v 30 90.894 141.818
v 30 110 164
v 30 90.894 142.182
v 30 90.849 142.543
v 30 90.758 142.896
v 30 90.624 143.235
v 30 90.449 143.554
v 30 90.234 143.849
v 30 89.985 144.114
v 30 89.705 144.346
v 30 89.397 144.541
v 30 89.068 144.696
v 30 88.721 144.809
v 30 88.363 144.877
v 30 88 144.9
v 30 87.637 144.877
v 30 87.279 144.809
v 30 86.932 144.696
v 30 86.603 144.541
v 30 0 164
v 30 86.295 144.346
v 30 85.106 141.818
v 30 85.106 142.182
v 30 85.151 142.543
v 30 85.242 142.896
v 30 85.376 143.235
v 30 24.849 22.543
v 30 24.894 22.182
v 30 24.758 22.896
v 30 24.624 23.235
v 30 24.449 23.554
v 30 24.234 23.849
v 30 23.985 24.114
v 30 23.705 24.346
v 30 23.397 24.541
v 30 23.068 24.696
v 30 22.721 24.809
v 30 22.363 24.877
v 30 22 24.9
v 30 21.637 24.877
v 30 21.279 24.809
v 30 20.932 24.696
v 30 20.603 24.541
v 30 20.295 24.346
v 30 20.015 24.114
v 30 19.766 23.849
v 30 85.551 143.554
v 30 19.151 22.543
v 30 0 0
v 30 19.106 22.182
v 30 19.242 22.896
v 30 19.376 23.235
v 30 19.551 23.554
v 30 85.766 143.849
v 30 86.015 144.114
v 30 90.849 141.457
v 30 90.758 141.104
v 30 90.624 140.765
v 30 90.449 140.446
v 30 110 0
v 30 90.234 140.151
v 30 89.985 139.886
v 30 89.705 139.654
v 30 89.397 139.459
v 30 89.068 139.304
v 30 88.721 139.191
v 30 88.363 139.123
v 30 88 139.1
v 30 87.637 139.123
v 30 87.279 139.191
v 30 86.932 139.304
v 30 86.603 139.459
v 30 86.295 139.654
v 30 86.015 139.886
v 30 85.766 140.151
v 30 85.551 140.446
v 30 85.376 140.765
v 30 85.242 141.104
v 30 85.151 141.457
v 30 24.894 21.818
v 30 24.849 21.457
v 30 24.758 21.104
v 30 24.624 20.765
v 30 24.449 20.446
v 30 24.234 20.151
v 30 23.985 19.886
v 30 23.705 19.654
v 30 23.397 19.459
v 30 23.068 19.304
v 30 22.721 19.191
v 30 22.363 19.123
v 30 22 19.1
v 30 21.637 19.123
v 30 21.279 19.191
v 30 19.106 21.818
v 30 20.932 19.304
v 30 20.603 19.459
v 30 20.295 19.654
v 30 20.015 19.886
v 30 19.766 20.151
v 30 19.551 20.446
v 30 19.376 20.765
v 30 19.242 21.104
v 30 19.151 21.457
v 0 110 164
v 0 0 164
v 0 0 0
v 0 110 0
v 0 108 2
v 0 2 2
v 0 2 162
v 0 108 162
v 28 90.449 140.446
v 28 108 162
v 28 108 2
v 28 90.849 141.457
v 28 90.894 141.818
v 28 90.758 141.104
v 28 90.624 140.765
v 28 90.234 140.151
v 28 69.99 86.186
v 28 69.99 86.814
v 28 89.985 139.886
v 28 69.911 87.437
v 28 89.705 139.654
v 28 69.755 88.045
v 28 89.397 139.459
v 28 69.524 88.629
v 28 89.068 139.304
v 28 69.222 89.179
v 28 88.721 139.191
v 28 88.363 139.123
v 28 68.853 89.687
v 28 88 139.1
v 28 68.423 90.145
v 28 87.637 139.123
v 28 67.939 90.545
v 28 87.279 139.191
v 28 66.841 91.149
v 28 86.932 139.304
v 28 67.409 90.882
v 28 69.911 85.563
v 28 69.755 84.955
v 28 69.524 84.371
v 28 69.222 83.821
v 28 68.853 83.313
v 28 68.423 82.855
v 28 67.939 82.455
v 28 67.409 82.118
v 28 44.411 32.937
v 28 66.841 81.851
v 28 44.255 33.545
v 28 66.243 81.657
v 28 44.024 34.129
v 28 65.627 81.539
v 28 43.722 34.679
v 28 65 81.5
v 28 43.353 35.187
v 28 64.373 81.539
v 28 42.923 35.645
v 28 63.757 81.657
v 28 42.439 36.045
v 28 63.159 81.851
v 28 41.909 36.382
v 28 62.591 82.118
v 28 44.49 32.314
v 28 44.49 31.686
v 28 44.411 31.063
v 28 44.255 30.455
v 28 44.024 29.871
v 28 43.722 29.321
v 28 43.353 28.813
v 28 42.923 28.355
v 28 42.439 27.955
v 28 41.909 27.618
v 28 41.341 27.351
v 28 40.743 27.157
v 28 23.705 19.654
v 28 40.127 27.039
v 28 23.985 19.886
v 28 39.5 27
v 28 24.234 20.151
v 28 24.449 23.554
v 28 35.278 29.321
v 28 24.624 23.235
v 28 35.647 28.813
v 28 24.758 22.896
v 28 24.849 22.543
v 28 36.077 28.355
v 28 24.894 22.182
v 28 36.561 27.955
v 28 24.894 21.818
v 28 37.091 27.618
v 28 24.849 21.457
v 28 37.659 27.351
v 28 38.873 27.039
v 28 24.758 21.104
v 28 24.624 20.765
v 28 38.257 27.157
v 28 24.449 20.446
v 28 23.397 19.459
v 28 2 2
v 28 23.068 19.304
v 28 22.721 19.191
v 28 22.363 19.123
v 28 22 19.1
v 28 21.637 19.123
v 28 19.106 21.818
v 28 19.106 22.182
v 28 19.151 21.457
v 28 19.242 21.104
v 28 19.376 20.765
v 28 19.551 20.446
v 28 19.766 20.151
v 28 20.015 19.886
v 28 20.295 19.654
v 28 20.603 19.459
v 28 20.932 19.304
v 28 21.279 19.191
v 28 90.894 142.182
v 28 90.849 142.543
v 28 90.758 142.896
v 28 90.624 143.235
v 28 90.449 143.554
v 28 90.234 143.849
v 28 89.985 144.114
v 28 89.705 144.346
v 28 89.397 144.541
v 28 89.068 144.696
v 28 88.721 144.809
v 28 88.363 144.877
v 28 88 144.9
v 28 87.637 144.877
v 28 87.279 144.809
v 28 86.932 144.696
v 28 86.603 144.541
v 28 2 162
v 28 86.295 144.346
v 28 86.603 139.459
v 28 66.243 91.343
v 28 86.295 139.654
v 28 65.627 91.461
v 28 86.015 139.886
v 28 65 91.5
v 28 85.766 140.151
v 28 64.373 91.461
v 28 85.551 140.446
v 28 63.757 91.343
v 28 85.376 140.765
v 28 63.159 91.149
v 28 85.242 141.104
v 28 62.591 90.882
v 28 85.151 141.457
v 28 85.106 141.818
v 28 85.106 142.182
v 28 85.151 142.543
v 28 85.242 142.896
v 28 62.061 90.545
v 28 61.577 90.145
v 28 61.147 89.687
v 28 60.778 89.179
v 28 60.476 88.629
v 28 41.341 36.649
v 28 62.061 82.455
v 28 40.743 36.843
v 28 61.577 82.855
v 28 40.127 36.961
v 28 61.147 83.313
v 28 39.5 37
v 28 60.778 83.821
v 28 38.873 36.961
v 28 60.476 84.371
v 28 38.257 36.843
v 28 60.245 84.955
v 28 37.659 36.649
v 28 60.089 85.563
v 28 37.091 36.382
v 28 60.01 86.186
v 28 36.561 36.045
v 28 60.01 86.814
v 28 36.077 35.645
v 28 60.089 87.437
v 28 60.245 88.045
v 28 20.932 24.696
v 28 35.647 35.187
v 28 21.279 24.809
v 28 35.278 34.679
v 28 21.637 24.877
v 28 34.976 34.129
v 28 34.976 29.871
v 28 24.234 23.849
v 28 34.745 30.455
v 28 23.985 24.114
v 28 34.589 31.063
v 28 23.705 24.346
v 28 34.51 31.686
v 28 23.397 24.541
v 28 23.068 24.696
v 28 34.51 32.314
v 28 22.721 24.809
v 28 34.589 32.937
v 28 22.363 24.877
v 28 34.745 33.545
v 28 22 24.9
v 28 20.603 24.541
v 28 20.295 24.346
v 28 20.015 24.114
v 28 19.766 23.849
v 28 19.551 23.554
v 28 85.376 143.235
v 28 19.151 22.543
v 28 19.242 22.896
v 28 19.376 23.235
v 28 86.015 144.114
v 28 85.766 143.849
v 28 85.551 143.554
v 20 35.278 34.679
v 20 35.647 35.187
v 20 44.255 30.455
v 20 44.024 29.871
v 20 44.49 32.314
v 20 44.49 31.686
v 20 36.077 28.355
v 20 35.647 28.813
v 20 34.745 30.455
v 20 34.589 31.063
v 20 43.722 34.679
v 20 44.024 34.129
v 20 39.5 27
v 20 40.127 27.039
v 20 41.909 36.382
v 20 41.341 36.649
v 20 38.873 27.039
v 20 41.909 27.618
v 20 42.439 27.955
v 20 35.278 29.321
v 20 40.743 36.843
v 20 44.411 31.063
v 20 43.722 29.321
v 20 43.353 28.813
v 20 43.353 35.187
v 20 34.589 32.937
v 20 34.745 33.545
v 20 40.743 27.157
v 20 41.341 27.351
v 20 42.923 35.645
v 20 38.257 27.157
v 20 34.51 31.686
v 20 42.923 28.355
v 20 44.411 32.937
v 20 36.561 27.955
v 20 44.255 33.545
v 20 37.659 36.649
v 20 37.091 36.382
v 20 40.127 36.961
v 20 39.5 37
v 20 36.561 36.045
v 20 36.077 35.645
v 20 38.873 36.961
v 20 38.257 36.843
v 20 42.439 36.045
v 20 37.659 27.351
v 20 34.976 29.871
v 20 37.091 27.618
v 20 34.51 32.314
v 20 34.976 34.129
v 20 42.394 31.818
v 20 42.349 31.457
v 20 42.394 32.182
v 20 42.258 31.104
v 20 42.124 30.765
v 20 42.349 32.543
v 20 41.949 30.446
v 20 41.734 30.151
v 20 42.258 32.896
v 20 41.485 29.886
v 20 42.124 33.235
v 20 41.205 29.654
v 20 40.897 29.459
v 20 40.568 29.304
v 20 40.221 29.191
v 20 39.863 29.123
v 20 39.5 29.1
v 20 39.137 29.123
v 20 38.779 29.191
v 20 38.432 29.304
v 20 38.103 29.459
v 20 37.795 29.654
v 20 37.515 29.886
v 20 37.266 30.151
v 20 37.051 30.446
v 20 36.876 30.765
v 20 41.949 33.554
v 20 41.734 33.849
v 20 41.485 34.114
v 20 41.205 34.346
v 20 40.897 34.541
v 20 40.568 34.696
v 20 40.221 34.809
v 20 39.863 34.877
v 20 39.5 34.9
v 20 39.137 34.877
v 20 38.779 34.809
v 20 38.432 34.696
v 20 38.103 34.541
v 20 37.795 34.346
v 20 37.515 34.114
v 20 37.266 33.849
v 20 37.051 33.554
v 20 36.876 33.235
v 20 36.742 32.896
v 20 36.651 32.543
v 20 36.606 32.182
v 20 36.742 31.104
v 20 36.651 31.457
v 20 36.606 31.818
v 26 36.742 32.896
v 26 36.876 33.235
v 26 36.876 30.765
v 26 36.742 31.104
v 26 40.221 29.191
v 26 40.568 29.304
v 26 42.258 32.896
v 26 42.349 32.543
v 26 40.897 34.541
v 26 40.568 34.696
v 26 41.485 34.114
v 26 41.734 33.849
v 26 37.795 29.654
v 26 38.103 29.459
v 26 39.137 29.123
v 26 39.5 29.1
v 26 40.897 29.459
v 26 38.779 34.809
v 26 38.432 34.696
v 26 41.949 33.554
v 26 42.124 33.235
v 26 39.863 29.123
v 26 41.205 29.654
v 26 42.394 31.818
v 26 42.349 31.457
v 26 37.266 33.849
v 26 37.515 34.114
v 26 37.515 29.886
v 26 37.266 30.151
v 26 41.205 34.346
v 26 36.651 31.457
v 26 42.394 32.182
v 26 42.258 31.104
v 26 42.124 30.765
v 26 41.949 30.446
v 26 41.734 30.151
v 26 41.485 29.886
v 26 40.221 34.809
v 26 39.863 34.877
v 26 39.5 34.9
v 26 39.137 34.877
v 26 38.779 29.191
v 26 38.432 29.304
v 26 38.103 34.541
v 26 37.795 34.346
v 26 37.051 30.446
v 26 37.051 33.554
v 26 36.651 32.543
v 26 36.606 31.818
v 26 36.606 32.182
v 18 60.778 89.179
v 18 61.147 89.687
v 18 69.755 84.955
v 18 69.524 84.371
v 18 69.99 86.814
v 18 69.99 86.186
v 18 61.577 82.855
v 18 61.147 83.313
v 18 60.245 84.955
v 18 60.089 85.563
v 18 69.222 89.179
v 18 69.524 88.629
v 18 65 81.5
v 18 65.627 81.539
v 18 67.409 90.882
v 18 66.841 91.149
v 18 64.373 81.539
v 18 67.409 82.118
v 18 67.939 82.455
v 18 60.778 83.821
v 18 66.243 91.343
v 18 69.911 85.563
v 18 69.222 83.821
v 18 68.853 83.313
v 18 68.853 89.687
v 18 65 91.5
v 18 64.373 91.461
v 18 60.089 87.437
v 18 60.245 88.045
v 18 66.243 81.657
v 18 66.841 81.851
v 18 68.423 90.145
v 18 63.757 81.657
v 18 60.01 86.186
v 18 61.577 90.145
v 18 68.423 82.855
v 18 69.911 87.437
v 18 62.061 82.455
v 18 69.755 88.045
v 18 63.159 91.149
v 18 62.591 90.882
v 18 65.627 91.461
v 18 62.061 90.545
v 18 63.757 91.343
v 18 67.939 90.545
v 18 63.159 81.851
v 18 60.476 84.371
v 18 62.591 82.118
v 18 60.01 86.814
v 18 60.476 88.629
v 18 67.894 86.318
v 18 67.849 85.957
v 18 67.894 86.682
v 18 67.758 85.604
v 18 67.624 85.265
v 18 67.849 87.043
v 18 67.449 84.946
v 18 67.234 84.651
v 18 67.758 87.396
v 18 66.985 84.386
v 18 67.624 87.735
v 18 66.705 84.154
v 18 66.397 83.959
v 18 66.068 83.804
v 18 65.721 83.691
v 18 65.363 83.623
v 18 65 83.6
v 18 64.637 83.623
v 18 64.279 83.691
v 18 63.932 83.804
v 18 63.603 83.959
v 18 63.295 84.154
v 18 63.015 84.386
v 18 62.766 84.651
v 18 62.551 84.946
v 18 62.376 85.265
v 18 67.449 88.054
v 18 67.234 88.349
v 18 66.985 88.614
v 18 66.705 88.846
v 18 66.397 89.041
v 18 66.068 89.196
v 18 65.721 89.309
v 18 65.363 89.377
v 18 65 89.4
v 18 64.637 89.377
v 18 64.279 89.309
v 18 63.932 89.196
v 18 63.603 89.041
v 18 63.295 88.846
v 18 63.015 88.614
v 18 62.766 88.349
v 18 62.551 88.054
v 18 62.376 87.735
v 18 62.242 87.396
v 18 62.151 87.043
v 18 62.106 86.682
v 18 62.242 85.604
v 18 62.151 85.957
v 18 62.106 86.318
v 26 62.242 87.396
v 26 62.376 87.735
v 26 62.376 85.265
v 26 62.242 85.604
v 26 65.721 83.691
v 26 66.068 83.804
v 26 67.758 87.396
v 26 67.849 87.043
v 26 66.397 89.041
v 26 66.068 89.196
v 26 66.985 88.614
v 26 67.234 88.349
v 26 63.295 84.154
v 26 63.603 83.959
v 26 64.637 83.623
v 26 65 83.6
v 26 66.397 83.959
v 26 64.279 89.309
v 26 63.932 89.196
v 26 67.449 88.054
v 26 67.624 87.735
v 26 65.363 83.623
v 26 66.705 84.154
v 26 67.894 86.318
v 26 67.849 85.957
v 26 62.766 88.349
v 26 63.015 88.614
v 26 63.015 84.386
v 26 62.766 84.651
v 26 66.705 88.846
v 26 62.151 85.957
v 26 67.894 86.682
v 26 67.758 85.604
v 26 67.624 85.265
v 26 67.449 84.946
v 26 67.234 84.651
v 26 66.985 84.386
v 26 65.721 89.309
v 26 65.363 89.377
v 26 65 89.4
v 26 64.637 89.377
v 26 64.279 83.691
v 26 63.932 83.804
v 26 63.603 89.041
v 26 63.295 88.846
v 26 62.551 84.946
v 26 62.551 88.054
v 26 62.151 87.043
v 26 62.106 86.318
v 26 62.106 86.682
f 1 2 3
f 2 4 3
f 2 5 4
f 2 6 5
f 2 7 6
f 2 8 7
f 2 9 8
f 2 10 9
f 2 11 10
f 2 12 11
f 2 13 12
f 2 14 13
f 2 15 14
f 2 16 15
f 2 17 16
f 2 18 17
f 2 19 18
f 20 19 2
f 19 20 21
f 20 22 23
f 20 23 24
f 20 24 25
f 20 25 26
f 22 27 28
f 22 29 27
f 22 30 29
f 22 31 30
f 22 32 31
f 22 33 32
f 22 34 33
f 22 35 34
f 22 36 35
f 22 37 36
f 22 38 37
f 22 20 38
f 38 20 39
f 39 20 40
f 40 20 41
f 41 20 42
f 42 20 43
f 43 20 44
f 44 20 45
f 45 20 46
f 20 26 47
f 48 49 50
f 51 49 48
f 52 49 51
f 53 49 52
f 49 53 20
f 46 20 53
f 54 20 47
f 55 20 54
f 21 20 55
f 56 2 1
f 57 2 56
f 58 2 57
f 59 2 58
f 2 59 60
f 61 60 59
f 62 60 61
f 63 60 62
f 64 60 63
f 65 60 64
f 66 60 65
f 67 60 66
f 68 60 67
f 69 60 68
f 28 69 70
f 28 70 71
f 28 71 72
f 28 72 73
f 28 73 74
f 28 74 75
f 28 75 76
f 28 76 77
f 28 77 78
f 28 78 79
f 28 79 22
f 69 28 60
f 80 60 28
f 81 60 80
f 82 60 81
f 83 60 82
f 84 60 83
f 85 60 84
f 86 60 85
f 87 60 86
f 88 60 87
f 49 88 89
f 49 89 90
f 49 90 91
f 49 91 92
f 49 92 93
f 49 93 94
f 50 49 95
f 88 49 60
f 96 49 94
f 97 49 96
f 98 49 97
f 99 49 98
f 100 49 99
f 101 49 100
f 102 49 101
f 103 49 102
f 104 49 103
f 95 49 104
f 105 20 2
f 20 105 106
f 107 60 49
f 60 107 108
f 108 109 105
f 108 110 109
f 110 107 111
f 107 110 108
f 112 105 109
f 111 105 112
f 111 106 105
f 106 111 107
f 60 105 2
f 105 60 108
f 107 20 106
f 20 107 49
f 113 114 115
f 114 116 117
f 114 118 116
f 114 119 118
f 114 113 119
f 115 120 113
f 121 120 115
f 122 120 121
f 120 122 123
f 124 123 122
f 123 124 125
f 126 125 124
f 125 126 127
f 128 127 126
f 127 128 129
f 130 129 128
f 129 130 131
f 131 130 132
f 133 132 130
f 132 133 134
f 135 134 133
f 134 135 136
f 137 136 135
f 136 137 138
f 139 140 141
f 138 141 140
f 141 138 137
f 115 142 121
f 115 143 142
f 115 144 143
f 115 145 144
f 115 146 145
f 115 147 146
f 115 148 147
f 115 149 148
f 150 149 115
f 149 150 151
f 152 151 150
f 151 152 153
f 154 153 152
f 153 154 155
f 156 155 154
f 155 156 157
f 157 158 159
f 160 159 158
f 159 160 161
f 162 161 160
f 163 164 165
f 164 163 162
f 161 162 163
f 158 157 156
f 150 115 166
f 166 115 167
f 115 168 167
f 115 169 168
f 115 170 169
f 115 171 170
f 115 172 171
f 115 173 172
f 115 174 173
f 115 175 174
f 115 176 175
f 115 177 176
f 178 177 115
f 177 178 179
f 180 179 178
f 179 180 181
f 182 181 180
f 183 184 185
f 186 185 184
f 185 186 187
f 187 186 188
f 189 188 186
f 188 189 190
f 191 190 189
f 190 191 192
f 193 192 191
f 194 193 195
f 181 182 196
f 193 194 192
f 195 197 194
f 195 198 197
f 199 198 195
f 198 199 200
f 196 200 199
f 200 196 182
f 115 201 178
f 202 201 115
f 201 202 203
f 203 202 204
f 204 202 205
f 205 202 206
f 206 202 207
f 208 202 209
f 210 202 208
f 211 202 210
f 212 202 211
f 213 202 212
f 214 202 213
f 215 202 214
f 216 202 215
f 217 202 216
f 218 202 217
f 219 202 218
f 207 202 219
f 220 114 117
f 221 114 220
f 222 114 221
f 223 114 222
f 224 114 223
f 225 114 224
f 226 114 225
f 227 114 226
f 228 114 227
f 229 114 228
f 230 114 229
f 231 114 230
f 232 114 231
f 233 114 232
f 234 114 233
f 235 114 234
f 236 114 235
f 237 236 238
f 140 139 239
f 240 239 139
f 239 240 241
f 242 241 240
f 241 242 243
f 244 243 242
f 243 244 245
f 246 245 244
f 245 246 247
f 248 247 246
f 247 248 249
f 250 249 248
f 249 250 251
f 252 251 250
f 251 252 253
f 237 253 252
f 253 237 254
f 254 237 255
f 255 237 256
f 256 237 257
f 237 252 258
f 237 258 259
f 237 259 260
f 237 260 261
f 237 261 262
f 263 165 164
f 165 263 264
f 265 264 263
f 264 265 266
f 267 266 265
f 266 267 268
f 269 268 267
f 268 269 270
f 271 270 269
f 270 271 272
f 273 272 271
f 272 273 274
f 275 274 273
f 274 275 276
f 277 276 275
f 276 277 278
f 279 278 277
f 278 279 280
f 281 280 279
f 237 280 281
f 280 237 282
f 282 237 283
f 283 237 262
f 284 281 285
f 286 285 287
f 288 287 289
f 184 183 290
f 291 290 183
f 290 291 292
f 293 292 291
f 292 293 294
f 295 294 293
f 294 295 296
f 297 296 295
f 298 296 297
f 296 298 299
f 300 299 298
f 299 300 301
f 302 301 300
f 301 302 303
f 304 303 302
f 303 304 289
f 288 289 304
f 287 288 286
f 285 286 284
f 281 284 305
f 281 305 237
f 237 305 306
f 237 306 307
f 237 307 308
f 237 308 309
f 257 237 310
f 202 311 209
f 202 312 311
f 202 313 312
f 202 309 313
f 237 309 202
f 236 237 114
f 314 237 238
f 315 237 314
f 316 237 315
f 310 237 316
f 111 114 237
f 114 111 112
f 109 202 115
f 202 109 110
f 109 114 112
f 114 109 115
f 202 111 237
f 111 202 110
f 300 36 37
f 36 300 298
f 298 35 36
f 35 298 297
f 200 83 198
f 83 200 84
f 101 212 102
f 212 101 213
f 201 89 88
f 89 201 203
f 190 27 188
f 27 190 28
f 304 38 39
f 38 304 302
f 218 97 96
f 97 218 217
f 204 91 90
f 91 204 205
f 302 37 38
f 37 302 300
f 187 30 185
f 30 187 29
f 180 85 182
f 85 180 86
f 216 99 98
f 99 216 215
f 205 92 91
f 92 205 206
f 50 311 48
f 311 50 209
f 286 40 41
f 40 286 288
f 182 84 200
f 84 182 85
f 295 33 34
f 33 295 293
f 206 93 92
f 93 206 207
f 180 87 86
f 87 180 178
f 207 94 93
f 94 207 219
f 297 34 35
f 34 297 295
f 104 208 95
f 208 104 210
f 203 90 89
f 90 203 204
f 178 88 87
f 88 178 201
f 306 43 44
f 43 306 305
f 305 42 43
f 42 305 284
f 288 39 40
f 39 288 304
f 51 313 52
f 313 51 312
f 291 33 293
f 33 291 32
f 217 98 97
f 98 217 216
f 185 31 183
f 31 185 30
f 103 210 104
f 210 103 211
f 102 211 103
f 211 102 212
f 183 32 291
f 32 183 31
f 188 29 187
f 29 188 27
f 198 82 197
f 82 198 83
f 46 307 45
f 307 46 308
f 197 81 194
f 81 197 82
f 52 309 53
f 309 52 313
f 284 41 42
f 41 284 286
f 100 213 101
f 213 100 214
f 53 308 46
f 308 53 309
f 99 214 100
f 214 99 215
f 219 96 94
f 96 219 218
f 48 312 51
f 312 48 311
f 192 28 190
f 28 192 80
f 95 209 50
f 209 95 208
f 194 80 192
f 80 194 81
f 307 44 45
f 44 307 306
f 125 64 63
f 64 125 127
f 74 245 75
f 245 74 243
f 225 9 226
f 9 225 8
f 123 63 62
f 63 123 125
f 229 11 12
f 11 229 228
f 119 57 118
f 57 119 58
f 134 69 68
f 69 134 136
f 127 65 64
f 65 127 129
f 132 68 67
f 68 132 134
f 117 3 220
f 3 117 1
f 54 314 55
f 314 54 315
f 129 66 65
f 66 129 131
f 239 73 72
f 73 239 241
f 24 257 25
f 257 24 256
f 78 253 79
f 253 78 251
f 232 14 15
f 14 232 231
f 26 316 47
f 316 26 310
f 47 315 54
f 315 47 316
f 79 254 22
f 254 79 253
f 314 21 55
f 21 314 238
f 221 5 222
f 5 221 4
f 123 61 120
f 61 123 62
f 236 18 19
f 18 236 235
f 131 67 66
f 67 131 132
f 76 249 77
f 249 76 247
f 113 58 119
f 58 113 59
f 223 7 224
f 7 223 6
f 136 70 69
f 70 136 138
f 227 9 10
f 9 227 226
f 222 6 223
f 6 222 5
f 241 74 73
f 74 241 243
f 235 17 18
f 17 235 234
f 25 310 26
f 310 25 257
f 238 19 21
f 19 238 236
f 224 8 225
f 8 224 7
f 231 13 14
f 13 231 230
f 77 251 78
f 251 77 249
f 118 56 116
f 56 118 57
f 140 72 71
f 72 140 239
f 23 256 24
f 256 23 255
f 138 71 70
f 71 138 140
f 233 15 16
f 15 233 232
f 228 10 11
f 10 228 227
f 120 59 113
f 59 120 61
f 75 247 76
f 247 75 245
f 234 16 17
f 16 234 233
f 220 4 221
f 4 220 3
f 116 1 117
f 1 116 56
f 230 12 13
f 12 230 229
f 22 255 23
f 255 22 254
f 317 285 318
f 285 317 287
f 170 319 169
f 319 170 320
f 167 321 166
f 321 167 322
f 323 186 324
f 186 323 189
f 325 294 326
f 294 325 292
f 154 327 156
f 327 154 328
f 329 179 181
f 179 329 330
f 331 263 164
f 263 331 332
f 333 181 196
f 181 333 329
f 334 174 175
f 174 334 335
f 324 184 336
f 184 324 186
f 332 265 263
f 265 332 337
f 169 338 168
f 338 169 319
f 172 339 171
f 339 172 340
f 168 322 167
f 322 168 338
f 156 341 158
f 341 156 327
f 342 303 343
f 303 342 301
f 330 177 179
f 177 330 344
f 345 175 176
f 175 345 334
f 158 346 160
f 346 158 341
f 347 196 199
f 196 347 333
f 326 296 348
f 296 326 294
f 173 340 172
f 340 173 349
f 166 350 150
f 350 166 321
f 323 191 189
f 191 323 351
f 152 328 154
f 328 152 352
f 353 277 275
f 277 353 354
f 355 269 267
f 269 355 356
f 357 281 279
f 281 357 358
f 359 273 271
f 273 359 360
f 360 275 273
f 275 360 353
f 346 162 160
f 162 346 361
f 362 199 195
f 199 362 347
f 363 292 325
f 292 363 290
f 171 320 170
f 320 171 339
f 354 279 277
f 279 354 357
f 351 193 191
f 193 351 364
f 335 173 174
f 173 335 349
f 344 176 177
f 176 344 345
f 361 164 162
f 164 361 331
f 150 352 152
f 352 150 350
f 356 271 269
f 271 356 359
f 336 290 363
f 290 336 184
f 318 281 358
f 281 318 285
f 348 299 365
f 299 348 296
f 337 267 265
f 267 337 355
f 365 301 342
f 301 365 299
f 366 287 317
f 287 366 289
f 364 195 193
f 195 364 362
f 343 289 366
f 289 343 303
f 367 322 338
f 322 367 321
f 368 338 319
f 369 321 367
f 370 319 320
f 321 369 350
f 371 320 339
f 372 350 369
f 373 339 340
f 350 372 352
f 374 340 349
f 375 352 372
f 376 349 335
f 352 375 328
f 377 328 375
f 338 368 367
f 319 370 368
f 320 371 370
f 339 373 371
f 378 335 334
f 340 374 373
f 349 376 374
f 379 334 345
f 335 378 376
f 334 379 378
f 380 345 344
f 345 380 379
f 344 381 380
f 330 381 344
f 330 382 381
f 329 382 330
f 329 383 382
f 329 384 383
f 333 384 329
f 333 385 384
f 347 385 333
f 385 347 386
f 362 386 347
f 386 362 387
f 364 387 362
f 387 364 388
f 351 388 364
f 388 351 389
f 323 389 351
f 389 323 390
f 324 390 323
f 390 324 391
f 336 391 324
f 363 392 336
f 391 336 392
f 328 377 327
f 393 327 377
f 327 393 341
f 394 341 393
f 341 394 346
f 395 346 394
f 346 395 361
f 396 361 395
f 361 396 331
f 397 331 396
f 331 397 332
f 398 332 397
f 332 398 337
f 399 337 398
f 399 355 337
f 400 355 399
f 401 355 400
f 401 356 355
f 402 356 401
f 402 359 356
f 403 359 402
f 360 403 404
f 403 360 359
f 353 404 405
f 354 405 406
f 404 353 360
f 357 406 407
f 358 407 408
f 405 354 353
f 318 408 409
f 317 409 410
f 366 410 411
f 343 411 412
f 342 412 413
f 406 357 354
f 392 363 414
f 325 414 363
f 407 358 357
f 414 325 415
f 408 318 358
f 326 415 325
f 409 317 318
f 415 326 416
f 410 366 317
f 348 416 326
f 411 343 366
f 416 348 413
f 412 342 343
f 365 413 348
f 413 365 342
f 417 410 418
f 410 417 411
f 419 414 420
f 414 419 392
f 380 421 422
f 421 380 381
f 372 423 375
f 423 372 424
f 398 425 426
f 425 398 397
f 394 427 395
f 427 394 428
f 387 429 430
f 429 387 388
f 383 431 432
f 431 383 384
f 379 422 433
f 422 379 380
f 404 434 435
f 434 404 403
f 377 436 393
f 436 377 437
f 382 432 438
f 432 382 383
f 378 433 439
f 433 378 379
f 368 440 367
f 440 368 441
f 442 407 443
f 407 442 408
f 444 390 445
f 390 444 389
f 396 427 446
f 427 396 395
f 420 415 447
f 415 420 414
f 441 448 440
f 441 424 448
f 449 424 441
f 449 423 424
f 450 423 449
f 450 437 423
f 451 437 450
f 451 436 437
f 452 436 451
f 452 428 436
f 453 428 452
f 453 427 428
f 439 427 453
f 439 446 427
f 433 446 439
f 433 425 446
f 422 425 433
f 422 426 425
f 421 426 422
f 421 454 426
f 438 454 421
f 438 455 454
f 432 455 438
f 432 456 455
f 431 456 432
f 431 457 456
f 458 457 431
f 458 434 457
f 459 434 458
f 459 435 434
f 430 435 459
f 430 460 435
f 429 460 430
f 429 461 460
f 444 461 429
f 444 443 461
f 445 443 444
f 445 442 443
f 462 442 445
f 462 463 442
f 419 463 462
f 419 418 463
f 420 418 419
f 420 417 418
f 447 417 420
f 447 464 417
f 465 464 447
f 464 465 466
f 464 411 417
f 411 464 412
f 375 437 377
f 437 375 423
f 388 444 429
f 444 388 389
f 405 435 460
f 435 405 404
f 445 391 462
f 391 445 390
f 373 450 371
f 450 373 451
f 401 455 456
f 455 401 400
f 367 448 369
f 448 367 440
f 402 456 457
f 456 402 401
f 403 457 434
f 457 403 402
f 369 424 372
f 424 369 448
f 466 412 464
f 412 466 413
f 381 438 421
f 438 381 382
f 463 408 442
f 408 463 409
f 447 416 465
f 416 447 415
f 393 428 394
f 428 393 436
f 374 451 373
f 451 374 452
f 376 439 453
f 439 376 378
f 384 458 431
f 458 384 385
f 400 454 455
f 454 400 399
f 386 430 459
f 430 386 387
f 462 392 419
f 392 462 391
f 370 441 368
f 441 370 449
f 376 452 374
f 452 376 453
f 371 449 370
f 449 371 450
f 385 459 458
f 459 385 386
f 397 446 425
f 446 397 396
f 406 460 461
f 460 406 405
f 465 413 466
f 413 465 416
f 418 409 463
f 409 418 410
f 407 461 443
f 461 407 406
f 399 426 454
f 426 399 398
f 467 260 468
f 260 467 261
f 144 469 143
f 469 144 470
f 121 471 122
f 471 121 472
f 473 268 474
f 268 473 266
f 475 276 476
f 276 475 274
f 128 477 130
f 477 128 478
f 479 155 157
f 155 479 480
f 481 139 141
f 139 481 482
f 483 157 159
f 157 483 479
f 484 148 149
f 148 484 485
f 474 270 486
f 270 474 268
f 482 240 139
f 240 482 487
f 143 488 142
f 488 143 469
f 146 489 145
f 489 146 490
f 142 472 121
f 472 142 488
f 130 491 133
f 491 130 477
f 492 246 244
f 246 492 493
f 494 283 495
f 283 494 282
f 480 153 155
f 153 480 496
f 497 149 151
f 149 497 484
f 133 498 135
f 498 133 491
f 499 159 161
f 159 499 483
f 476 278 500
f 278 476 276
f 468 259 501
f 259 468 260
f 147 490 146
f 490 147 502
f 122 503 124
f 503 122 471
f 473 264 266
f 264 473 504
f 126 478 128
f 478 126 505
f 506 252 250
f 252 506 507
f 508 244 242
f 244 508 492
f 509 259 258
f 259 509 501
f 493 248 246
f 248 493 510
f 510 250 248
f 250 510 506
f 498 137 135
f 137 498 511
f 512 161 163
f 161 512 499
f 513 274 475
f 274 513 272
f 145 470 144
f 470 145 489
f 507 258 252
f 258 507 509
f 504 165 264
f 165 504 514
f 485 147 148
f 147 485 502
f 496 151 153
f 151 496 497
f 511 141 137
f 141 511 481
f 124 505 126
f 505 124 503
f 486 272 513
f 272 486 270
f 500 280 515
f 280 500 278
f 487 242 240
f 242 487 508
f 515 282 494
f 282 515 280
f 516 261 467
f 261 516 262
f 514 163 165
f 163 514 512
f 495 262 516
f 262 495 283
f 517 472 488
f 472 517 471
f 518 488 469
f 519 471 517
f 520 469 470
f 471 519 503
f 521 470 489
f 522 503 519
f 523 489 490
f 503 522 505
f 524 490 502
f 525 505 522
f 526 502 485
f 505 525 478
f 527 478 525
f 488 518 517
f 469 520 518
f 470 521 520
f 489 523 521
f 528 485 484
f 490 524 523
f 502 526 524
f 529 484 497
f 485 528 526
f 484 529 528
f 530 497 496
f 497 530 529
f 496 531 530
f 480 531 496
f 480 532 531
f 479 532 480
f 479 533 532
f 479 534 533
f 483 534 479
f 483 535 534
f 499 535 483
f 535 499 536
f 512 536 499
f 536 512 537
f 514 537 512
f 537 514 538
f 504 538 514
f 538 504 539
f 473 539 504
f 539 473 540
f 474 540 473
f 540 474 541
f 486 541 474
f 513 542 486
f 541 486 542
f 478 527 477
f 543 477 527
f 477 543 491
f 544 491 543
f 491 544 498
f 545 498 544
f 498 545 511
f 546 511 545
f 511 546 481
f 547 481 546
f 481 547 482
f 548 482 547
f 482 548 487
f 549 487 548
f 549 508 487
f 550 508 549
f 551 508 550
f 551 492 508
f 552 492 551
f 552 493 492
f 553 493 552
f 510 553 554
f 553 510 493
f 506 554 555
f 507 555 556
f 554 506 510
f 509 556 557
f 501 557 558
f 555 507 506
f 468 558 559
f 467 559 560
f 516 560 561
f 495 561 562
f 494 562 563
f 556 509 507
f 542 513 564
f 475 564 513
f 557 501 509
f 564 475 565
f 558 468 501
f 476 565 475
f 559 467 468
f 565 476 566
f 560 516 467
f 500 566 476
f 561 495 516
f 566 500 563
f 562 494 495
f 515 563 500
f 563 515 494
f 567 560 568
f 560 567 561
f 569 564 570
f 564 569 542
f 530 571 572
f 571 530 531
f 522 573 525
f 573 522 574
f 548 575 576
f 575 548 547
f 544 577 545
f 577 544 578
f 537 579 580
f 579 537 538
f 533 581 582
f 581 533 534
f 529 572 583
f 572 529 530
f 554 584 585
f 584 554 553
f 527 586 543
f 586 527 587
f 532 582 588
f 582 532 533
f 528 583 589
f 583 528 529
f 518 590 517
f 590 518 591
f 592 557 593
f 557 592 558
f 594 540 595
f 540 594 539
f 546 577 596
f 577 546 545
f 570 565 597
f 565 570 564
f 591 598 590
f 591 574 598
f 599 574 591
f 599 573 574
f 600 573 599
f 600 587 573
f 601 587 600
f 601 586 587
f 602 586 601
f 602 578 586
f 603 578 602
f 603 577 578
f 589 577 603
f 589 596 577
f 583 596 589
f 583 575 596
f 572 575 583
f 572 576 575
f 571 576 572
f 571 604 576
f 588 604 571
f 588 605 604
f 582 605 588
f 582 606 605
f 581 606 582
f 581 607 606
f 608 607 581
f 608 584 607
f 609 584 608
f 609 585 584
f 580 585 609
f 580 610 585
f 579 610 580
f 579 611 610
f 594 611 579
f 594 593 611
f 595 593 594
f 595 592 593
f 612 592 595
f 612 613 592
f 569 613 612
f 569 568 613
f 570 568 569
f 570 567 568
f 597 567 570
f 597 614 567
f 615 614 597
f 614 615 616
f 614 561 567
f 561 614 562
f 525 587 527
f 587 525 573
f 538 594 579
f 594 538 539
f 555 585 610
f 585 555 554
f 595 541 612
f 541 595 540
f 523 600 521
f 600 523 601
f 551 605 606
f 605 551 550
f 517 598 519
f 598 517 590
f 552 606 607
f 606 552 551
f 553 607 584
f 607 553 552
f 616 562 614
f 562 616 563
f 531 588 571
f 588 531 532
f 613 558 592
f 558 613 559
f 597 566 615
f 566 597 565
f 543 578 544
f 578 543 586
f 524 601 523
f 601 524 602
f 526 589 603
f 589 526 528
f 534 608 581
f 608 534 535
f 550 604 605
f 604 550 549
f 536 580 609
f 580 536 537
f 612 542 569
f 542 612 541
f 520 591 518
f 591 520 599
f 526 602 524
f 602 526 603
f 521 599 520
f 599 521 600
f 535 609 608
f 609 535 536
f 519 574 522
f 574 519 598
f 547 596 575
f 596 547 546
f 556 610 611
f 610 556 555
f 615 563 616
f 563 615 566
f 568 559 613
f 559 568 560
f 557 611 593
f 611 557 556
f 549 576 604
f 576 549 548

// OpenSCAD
// Parameters

// Main box
w = 110;
l = 164;
h = 30;
thickness = 2; 

// Holes
fixation_hole_r = 2.9;
cylinder_resolution = 50;
distance_from_edges = 20;

// Mounting Raspberry Pi
mount_h = 10;
mount_r = 5;
rpi_from_edges = 25;
rpi_w = 56;
rpi_l = 85;
h_1_w = 12.5;
h_1_l = 5;
h_2_w = 18;
h_2_l = 25.5;


// Back box
difference(){

	difference(){
		cube([h,w,l]);
		translate([-thickness,thickness,thickness]) {
  			cube([h,w-2*thickness,l-2*thickness]);
		}
	}

	translate([0,distance_from_edges+thickness,distance_from_edges+thickness]) {
		rotate([0,90,0]){
			cylinder(h = 40, r=fixation_hole_r, $fn=cylinder_resolution);
		} 
	}

	translate([0,w-distance_from_edges-thickness,l-distance_from_edges-thickness]) {
		rotate([0,90,0]){
			cylinder(h = 40, r=fixation_hole_r, $fn=cylinder_resolution);
		} 
	}

}

difference(){
translate([h-mount_h,h_1_w+rpi_from_edges+thickness,h_1_l+thickness+rpi_from_edges]) {
		rotate([0,90,0]){
			cylinder(h = mount_h, r=mount_r, $fn=cylinder_resolution);
		} 
	}

translate([h-mount_h-2*thickness,h_1_w+rpi_from_edges+thickness,h_1_l+thickness+rpi_from_edges]) {
		rotate([0,90,0]){
			cylinder(h = mount_h, r=fixation_hole_r, $fn=cylinder_resolution);
		} 
	}
}

difference(){
translate([h-mount_h-thickness,rpi_w+rpi_from_edges+thickness-h_2_w,rpi_l+thickness+rpi_from_edges-h_2_l]) {
		rotate([0,90,0]){
			cylinder(h = mount_h, r=mount_r, $fn=cylinder_resolution);
		} 
	}

translate([h-mount_h-2*thickness,rpi_w+rpi_from_edges+thickness-h_2_w,rpi_l+thickness+rpi_from_edges-h_2_l]) {
		rotate([0,90,0]){
			cylinder(h = mount_h, r=fixation_hole_r, $fn=cylinder_resolution);
		} 
	}
}
